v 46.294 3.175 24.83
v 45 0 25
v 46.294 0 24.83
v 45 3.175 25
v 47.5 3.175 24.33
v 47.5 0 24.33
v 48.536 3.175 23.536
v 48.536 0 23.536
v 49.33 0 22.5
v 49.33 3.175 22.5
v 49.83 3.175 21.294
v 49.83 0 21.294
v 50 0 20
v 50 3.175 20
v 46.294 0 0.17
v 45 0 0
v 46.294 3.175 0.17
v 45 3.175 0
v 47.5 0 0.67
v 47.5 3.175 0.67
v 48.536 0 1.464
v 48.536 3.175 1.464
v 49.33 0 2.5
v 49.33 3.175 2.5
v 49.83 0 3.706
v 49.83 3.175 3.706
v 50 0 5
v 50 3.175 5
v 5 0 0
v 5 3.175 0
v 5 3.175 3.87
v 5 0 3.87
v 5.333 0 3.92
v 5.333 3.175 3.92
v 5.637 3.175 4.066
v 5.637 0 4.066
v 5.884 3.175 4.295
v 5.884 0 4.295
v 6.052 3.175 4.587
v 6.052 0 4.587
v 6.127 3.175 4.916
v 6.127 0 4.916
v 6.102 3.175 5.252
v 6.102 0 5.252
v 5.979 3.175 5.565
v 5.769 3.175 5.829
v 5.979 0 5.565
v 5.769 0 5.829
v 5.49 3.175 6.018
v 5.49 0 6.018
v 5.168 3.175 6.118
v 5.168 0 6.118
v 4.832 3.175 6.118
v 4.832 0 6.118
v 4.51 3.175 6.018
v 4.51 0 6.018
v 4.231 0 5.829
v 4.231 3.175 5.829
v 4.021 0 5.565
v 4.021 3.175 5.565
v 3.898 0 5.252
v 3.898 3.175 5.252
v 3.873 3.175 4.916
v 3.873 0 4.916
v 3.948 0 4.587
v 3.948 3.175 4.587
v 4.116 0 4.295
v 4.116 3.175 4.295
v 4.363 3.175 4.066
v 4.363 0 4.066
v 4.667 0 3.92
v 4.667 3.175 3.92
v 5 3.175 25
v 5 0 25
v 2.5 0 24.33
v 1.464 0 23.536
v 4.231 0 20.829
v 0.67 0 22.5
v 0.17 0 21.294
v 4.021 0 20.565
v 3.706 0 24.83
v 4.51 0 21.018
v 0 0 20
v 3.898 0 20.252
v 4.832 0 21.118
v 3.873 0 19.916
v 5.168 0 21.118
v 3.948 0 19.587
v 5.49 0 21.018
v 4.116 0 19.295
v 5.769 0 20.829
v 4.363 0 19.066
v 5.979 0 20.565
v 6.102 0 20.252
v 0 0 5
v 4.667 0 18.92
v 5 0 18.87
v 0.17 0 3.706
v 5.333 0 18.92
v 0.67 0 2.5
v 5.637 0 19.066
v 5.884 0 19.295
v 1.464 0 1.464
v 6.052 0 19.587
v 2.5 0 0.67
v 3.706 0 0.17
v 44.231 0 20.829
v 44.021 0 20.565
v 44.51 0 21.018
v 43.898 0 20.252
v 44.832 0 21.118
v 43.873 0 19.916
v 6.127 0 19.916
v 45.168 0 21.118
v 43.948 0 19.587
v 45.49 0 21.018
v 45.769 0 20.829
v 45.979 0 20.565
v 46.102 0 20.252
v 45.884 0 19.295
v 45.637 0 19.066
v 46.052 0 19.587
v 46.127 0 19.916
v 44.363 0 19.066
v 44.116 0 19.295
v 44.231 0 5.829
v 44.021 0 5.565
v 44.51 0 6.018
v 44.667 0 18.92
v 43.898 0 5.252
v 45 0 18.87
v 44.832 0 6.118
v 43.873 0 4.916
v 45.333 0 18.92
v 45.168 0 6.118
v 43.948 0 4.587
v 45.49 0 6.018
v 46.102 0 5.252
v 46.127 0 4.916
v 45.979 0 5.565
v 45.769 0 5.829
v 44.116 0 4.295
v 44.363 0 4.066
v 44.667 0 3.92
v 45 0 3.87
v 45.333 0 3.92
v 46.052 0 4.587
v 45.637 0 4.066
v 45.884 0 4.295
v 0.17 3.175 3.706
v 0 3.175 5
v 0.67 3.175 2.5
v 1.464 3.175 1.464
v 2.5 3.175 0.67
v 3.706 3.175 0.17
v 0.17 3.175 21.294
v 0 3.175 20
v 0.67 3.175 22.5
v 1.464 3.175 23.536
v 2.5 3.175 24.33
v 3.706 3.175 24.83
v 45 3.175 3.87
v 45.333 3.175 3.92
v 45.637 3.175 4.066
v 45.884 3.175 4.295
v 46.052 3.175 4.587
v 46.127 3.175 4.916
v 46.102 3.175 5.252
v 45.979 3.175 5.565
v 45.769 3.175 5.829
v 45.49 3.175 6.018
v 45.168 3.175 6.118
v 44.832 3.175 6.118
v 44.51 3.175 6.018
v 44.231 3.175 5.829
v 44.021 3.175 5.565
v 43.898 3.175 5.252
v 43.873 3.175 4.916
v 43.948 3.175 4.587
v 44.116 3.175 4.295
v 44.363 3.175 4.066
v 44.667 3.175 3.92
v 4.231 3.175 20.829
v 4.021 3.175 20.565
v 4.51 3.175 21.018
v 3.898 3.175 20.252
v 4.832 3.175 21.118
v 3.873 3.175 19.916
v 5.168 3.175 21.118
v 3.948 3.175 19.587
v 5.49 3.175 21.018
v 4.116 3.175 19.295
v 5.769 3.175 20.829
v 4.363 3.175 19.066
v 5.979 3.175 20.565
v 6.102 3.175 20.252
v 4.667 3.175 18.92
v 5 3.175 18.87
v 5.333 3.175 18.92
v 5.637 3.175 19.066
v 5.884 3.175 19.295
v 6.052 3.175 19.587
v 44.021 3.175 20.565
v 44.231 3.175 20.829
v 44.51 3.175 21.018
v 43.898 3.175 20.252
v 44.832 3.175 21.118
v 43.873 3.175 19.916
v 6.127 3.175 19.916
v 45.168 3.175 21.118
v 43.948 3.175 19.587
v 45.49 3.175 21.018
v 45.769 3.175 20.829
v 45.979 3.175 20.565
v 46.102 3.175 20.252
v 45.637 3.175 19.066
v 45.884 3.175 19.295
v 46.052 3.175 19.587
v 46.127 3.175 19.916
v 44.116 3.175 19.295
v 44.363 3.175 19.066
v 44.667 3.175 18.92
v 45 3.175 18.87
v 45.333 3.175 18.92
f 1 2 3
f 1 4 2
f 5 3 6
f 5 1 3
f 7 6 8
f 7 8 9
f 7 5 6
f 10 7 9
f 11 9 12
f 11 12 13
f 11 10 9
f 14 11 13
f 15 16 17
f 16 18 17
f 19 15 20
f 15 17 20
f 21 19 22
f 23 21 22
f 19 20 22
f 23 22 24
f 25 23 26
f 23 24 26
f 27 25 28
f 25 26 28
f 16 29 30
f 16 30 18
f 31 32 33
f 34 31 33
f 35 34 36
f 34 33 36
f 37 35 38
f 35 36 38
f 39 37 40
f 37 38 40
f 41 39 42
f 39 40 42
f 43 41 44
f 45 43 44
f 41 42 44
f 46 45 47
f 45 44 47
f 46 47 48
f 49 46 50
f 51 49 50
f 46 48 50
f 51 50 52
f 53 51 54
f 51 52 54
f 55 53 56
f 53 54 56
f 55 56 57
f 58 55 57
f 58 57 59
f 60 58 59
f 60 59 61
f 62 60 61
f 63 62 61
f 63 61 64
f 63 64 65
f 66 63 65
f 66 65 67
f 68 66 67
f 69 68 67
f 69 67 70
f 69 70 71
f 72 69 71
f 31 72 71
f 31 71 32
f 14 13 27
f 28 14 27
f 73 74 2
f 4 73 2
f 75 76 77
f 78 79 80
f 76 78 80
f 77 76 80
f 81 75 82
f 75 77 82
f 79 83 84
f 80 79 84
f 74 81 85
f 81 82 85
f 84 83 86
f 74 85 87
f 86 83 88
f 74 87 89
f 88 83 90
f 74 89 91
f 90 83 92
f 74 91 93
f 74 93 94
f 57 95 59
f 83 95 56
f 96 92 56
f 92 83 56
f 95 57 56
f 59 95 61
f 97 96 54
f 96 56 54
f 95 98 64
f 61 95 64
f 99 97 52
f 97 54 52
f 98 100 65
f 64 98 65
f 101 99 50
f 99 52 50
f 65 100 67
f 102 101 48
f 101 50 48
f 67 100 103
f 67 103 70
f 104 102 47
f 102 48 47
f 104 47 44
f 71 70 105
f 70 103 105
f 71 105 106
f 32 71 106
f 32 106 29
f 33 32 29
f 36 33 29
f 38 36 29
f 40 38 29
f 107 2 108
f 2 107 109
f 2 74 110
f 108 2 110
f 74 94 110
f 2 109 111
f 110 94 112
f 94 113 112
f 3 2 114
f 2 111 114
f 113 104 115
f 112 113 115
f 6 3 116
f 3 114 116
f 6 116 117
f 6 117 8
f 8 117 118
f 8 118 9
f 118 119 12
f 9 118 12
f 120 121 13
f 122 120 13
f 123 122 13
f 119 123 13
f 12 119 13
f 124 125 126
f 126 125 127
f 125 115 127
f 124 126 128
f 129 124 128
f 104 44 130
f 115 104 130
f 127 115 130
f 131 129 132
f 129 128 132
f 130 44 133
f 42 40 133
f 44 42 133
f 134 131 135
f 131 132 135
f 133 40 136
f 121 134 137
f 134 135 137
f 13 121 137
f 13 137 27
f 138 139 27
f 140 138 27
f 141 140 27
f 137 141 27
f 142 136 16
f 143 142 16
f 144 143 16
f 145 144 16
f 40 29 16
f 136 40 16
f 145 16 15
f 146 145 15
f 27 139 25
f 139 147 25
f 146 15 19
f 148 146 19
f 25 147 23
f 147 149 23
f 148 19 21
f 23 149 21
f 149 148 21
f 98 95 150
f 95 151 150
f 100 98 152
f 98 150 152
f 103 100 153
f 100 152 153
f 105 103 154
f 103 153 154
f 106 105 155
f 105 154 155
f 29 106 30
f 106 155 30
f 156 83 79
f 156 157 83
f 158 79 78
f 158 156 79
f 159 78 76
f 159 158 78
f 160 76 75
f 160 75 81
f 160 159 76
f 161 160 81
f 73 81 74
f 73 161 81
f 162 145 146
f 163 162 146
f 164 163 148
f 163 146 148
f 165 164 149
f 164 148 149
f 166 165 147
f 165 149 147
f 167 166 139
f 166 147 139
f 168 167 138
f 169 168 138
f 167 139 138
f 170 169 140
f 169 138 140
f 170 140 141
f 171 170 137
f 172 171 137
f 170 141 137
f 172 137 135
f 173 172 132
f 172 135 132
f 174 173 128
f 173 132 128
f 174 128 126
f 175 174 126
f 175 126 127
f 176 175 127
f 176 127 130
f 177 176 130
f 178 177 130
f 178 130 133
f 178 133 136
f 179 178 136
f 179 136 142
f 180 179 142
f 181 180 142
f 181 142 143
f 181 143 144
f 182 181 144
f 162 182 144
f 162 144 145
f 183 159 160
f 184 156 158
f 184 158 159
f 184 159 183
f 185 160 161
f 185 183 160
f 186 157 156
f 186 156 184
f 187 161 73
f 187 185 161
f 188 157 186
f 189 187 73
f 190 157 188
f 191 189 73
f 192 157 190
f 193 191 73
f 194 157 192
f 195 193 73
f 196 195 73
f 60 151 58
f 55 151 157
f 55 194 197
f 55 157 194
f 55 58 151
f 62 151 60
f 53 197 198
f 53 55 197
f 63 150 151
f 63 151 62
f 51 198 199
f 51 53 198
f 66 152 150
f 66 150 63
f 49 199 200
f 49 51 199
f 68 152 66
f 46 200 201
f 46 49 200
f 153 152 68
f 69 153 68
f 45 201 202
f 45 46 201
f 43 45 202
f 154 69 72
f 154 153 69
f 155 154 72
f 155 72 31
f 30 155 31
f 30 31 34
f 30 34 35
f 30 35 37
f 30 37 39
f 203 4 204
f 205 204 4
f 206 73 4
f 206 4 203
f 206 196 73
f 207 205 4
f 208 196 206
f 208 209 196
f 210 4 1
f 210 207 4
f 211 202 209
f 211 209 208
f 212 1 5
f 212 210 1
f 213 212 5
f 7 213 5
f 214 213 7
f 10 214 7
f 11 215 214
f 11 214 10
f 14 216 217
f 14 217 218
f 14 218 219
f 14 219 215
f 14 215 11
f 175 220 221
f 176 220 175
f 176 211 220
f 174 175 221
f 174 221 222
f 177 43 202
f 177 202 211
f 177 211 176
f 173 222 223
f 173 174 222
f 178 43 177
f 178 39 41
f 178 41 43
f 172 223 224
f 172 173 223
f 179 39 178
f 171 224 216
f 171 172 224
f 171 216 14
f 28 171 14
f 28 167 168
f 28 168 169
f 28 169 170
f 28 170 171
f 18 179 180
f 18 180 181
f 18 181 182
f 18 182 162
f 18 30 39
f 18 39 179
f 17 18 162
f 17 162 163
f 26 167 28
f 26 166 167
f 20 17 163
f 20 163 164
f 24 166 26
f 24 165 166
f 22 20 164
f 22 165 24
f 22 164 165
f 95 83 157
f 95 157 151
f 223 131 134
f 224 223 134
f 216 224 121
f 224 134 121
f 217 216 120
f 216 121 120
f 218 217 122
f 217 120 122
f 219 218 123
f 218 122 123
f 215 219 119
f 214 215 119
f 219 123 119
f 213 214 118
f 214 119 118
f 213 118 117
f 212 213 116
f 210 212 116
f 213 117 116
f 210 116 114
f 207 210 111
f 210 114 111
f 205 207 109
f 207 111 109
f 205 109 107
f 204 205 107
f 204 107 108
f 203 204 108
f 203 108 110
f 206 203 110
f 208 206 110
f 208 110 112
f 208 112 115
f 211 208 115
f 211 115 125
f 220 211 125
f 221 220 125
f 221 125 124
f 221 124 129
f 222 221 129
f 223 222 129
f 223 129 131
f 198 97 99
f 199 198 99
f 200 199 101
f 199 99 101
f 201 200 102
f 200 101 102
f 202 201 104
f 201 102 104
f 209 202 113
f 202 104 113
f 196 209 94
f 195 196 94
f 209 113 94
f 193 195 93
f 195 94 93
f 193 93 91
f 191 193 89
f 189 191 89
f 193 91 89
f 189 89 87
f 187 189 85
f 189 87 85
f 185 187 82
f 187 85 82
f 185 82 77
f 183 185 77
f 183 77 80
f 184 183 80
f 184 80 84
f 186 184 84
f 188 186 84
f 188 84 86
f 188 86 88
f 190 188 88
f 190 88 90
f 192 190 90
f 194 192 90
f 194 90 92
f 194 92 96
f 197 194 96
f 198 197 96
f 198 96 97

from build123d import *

# Parameters (mm, degrees)
SKETCH1_W                       = 50
SKETCH1_H                       = 25
SKETCH1_R                       = 1.13
BOSS_EXTRUDE1_DEPTH             = 3.175
FILLET1_R                       = 5
F_4_40_TAPPED_HOLE1_D           = 2.2606
F_4_40_TAPPED_HOLE1_ON_FACE_2_D = 2.2606


with BuildPart() as part:
    # Sketch1 → Boss-Extrude1 (new body)
    with BuildSketch(Plane(origin=(0, 0, 0), x_dir=(1, 0, 0), z_dir=(0, 1, 0))):
        with Locations((25, -12.5)):
            Rectangle(SKETCH1_W, SKETCH1_H)
        with Locations(Location((5, -5, 0), (0, 0, 270))):
            Circle(SKETCH1_R, mode=Mode.SUBTRACT)
        with Locations(Location((45, -5, 0), (0, 0, 270))):
            Circle(SKETCH1_R, mode=Mode.SUBTRACT)
        with Locations(Location((45, -20, 0), (0, 0, 270))):
            Circle(SKETCH1_R, mode=Mode.SUBTRACT)
        with Locations(Location((5, -20, 0), (0, 0, 270))):
            Circle(SKETCH1_R, mode=Mode.SUBTRACT)
    extrude(amount=BOSS_EXTRUDE1_DEPTH)

    # Fillet1
    fillet1_edges = [part.edges().sort_by_distance(p)[0] for p in [
        (0, 1.5875, 0),
        (50, 1.5875, 0),
        (50, 1.5875, 25),
        (0, 1.5875, 25),
    ]]
    fillet(fillet1_edges, radius=FILLET1_R)

    # #4-40 Tapped Hole1 (through all)
    with Locations(Plane(origin=(5, 3.175, 5), x_dir=(0, 0, 1), z_dir=(0, 1, 0))):
        with Locations((0, 0), (0, 40), (15, 40)):
            Hole(F_4_40_TAPPED_HOLE1_D / 2)

    # #4-40 Tapped Hole1 on face 2 (through all)
    with Locations(Plane(origin=(5, 0, 20), x_dir=(0, 0, 1), z_dir=(0, 1, 0))):
        with Locations((0, 0)):
            Hole(F_4_40_TAPPED_HOLE1_ON_FACE_2_D / 2)


solid = part.part
